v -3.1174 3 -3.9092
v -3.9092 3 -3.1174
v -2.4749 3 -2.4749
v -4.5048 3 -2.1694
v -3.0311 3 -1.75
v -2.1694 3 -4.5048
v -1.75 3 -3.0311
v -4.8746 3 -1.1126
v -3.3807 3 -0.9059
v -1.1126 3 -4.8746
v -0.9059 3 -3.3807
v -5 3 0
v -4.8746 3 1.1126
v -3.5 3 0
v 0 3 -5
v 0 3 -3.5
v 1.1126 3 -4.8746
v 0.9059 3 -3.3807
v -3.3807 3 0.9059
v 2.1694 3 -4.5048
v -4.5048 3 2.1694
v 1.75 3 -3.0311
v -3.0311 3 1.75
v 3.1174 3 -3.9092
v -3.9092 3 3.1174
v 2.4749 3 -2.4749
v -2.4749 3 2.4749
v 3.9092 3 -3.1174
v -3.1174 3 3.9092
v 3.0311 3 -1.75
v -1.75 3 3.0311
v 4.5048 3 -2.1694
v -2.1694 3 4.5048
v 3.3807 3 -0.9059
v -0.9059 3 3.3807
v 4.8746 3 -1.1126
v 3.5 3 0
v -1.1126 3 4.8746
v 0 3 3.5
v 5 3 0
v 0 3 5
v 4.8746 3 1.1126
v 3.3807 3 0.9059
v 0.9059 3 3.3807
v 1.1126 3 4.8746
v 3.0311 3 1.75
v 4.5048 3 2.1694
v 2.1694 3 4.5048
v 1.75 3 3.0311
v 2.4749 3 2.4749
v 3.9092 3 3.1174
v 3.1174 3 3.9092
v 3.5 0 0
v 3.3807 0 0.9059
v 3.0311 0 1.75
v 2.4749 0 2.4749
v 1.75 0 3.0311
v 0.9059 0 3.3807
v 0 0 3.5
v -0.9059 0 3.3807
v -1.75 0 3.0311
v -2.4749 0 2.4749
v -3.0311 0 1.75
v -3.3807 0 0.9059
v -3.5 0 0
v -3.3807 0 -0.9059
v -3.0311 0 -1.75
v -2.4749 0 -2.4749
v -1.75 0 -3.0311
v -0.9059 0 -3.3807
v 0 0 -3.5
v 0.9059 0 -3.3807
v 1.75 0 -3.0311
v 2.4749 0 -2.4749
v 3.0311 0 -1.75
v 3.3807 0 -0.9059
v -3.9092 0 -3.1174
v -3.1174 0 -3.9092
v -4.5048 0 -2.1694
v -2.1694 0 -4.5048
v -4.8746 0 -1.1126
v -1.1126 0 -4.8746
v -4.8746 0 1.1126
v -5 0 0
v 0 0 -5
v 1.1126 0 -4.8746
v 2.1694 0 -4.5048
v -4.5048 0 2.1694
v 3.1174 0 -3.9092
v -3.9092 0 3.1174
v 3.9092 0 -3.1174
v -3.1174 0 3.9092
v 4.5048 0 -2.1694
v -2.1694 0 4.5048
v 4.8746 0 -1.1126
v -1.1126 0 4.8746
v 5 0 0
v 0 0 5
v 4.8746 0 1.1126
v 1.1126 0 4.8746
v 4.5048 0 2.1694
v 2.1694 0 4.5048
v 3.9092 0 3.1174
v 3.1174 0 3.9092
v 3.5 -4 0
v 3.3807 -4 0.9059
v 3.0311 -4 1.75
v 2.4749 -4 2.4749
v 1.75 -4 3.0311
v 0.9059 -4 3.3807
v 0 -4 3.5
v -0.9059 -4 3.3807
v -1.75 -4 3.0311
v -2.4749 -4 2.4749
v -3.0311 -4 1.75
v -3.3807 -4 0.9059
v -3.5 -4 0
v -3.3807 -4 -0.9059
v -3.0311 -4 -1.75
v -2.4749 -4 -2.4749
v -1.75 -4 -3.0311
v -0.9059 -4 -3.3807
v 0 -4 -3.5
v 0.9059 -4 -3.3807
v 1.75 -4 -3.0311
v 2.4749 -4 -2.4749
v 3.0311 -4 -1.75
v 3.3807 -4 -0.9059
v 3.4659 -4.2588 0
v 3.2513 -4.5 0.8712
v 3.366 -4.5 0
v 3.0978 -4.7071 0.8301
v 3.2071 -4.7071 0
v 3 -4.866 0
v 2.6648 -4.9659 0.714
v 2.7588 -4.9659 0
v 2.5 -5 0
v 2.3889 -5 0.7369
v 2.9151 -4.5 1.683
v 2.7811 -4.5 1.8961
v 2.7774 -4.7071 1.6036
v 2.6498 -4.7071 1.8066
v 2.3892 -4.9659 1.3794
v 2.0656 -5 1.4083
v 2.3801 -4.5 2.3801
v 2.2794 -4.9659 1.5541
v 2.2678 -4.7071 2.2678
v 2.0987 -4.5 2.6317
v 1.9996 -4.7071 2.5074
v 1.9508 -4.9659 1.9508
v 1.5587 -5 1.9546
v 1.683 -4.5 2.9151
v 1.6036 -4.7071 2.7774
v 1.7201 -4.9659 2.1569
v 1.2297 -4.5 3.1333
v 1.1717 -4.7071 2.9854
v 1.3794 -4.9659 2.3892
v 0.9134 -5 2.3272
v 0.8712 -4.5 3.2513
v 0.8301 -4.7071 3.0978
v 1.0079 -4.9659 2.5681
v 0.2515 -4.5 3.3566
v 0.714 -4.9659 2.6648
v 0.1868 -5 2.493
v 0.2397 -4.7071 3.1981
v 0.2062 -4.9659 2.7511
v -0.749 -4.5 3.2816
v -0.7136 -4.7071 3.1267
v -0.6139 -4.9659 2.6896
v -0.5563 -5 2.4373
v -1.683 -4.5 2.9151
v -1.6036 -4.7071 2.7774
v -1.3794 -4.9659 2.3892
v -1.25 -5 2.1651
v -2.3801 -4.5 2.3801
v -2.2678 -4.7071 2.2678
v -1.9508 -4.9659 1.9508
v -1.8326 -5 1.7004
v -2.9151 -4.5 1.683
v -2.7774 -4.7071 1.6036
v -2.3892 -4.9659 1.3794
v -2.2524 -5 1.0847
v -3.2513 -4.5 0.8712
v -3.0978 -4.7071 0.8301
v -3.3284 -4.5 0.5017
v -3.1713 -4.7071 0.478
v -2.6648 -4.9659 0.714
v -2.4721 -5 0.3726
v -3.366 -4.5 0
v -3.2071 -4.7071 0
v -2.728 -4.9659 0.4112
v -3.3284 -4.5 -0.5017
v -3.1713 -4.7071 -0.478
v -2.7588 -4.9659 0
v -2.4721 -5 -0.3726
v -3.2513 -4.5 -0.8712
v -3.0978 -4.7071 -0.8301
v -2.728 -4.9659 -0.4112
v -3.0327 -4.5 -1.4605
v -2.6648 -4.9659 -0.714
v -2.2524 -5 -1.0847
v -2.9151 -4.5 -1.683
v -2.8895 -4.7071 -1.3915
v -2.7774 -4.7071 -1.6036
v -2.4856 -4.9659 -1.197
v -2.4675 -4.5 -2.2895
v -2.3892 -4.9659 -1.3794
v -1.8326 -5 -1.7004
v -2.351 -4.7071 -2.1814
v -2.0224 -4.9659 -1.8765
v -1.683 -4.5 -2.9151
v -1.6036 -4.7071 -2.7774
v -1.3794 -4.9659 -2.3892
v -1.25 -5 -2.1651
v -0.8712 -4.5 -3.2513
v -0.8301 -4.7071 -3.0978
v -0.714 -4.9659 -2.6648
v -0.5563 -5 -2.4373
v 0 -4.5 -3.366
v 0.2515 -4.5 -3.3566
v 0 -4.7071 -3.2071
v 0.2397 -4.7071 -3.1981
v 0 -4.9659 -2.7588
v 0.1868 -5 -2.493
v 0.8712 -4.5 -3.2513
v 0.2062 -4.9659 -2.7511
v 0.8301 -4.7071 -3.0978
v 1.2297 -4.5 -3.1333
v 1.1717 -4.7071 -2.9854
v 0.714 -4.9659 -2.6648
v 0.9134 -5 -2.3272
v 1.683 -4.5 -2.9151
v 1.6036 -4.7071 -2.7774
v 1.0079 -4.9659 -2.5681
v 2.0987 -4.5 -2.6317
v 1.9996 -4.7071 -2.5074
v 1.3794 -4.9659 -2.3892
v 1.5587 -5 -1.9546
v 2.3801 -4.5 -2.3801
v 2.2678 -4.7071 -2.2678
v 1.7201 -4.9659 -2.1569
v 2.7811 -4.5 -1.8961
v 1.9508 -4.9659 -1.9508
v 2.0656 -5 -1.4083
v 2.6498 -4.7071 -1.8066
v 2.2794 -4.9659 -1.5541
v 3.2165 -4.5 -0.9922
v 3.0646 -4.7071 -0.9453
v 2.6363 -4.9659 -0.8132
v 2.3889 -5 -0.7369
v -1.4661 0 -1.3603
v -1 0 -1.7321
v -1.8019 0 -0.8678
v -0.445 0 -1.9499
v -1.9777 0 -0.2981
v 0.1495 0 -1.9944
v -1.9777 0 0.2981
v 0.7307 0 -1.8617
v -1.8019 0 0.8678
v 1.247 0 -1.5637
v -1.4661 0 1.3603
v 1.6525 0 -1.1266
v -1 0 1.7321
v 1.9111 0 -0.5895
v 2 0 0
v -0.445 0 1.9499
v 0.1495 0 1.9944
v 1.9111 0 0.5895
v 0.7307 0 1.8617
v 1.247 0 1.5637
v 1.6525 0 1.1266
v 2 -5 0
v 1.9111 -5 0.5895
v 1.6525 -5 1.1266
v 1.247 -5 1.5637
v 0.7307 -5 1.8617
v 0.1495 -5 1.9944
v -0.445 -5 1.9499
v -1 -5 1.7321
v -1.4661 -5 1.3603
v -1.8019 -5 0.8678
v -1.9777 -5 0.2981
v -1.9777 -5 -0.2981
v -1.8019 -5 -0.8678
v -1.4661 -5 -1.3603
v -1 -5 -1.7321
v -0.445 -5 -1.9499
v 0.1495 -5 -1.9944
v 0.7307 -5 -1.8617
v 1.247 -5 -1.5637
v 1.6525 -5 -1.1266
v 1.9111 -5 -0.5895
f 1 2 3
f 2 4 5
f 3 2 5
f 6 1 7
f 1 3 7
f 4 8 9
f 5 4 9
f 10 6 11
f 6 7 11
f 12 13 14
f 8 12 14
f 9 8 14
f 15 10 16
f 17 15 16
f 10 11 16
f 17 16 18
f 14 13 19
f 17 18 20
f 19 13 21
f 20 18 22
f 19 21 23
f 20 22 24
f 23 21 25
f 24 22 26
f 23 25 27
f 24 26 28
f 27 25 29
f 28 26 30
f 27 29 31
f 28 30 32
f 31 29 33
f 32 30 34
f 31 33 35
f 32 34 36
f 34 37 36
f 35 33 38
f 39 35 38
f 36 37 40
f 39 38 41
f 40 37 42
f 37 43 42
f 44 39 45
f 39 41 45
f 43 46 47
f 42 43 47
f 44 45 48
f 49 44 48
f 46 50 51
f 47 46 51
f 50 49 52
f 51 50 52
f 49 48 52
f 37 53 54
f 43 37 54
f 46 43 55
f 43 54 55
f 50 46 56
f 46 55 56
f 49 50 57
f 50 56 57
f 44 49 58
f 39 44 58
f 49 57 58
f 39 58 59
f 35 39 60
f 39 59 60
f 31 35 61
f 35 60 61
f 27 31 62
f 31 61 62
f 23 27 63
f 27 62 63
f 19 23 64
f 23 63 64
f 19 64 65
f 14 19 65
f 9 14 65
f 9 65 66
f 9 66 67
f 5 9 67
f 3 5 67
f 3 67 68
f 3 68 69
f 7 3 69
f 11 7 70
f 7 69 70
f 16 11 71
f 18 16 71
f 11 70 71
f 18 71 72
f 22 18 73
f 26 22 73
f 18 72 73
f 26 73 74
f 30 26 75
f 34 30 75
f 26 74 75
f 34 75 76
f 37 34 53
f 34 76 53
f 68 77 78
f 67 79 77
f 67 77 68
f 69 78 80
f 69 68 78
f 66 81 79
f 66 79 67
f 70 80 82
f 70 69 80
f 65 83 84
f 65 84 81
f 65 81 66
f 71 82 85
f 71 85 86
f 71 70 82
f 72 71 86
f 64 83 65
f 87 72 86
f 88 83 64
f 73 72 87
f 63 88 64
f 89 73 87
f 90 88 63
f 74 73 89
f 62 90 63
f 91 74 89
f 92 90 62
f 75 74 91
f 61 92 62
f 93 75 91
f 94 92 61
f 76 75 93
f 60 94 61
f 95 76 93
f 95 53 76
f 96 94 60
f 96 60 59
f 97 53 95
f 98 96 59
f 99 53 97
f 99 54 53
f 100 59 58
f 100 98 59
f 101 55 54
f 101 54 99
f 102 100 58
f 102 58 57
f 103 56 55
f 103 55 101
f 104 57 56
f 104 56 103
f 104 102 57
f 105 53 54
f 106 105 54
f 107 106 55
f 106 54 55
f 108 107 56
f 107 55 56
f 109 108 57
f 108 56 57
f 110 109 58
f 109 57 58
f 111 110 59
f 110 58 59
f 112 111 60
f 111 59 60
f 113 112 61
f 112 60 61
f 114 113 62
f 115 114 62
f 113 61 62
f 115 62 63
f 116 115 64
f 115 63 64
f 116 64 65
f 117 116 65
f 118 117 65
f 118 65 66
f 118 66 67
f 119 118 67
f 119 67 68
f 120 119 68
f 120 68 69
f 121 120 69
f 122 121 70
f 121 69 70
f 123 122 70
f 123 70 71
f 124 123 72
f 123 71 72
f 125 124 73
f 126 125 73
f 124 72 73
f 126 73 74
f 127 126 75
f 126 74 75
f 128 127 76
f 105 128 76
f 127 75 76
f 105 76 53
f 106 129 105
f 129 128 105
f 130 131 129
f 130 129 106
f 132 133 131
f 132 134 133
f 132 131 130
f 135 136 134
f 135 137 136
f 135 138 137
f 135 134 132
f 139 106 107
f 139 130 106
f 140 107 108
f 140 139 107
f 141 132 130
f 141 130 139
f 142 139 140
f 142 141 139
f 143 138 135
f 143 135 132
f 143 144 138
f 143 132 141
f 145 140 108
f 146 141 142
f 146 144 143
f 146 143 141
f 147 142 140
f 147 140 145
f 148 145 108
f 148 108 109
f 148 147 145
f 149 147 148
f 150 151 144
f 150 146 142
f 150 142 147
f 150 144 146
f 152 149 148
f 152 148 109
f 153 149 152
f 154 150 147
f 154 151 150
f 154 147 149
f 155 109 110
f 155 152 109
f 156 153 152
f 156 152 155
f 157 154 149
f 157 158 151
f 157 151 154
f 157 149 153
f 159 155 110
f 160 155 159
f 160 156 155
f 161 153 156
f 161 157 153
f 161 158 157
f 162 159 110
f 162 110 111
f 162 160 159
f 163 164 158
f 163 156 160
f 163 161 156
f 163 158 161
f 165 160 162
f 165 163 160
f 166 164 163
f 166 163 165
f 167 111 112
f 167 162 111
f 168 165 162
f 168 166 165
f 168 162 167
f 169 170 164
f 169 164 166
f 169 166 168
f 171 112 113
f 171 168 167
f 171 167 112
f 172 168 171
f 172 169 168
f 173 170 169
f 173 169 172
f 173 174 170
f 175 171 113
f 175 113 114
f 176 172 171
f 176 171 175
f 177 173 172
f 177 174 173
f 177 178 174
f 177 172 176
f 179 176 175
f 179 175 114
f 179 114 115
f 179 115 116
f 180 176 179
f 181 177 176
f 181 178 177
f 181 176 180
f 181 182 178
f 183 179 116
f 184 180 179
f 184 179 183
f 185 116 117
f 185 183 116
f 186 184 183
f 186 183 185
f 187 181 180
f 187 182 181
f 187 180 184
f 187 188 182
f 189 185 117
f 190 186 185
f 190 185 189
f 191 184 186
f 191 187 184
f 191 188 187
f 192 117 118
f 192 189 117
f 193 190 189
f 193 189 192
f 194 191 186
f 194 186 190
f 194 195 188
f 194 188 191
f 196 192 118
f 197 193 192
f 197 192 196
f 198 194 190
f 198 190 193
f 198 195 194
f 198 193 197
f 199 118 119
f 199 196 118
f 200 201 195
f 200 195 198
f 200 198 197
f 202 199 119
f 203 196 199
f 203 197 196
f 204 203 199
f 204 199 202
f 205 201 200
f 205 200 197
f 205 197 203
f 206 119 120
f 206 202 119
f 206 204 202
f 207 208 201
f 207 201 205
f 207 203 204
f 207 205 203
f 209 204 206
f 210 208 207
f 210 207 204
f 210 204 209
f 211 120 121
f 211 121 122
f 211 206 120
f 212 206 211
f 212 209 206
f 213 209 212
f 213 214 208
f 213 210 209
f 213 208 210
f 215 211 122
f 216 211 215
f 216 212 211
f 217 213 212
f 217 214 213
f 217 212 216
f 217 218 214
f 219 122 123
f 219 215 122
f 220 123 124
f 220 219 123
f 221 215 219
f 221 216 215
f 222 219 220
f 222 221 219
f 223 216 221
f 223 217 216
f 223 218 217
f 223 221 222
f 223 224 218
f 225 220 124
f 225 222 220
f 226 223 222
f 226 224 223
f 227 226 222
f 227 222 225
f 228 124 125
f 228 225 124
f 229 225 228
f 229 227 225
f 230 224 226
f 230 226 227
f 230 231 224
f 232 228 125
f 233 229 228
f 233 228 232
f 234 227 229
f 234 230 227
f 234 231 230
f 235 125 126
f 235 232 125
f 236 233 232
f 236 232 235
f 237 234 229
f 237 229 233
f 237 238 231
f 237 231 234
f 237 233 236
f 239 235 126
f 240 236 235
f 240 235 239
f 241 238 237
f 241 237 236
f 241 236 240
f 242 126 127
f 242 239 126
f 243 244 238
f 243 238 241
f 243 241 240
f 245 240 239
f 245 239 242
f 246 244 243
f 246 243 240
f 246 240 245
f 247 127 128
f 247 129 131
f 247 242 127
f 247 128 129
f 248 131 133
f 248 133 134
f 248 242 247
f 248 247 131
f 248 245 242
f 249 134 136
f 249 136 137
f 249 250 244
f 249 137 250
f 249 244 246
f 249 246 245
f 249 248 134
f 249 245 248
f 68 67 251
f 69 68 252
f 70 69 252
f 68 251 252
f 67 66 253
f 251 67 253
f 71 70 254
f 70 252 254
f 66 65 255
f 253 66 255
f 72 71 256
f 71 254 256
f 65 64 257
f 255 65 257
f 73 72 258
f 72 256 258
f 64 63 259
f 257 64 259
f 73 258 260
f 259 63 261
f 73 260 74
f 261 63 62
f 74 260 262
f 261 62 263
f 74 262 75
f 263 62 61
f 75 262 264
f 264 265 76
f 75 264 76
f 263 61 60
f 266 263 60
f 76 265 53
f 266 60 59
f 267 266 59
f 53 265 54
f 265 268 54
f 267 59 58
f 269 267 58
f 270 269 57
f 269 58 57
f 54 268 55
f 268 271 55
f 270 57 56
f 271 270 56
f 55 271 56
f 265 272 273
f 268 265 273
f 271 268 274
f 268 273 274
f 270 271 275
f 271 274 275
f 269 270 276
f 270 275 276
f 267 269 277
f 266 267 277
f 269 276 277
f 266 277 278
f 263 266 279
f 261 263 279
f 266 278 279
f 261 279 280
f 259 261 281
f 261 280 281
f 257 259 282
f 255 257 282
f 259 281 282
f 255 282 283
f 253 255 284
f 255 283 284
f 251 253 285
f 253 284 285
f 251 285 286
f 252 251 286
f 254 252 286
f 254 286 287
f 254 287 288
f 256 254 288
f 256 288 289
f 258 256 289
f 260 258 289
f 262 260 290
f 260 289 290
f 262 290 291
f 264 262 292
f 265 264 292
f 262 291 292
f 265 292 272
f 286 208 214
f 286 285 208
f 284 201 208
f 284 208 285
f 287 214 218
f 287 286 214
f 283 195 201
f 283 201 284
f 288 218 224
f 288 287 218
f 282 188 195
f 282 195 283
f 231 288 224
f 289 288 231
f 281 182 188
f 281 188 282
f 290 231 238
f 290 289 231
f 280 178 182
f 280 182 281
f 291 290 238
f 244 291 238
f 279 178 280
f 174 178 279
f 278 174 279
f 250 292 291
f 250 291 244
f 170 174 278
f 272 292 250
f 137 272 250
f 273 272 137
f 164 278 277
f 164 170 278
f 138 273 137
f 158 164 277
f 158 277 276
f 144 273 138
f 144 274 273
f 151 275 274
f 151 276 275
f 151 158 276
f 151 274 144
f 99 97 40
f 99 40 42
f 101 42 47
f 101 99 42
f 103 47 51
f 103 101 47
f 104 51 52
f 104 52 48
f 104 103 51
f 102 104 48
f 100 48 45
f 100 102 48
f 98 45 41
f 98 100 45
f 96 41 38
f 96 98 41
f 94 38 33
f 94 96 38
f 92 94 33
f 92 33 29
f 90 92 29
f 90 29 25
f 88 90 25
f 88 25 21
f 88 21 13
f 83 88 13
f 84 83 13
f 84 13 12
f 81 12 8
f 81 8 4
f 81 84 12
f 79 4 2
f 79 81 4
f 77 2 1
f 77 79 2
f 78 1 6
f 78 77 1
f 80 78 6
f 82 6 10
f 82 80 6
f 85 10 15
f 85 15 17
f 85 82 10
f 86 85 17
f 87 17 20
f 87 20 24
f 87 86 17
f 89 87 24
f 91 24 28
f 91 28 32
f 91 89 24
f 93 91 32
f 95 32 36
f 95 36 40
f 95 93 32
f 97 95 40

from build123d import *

# Parameters (mm, degrees)
F0_R     = 5
F0_R_2   = 3.5
F1_DEPTH = 3
F2_DEPTH = 5
F3_R     = 2
F4_DEPTH = 5
F5_R     = 1


with BuildPart() as f1:
    # F0 (on Front) → F1 (new body)
    with BuildSketch(Plane.XZ):
        Circle(F0_R)
        Circle(F0_R_2, mode=Mode.SUBTRACT)
    extrude(amount=-F1_DEPTH)


with BuildPart() as f2:
    # F0 (on Front) → F2 (new body)
    with BuildSketch(Plane.XZ):
        Circle(F0_R_2)
    extrude(amount=F2_DEPTH)

    # F3 (on face) → F4 (cut)
    with BuildSketch(Plane.XZ.offset(5)):
        Circle(F3_R)
    extrude(amount=-F4_DEPTH, mode=Mode.SUBTRACT)

    # F5
    f5_edges = [f2.edges().sort_by_distance(p)[0] for p in [
        (-3.5, -5, 0),
    ]]
    fillet(f5_edges, radius=F5_R)


solid = Compound([f1.part, f2.part])
